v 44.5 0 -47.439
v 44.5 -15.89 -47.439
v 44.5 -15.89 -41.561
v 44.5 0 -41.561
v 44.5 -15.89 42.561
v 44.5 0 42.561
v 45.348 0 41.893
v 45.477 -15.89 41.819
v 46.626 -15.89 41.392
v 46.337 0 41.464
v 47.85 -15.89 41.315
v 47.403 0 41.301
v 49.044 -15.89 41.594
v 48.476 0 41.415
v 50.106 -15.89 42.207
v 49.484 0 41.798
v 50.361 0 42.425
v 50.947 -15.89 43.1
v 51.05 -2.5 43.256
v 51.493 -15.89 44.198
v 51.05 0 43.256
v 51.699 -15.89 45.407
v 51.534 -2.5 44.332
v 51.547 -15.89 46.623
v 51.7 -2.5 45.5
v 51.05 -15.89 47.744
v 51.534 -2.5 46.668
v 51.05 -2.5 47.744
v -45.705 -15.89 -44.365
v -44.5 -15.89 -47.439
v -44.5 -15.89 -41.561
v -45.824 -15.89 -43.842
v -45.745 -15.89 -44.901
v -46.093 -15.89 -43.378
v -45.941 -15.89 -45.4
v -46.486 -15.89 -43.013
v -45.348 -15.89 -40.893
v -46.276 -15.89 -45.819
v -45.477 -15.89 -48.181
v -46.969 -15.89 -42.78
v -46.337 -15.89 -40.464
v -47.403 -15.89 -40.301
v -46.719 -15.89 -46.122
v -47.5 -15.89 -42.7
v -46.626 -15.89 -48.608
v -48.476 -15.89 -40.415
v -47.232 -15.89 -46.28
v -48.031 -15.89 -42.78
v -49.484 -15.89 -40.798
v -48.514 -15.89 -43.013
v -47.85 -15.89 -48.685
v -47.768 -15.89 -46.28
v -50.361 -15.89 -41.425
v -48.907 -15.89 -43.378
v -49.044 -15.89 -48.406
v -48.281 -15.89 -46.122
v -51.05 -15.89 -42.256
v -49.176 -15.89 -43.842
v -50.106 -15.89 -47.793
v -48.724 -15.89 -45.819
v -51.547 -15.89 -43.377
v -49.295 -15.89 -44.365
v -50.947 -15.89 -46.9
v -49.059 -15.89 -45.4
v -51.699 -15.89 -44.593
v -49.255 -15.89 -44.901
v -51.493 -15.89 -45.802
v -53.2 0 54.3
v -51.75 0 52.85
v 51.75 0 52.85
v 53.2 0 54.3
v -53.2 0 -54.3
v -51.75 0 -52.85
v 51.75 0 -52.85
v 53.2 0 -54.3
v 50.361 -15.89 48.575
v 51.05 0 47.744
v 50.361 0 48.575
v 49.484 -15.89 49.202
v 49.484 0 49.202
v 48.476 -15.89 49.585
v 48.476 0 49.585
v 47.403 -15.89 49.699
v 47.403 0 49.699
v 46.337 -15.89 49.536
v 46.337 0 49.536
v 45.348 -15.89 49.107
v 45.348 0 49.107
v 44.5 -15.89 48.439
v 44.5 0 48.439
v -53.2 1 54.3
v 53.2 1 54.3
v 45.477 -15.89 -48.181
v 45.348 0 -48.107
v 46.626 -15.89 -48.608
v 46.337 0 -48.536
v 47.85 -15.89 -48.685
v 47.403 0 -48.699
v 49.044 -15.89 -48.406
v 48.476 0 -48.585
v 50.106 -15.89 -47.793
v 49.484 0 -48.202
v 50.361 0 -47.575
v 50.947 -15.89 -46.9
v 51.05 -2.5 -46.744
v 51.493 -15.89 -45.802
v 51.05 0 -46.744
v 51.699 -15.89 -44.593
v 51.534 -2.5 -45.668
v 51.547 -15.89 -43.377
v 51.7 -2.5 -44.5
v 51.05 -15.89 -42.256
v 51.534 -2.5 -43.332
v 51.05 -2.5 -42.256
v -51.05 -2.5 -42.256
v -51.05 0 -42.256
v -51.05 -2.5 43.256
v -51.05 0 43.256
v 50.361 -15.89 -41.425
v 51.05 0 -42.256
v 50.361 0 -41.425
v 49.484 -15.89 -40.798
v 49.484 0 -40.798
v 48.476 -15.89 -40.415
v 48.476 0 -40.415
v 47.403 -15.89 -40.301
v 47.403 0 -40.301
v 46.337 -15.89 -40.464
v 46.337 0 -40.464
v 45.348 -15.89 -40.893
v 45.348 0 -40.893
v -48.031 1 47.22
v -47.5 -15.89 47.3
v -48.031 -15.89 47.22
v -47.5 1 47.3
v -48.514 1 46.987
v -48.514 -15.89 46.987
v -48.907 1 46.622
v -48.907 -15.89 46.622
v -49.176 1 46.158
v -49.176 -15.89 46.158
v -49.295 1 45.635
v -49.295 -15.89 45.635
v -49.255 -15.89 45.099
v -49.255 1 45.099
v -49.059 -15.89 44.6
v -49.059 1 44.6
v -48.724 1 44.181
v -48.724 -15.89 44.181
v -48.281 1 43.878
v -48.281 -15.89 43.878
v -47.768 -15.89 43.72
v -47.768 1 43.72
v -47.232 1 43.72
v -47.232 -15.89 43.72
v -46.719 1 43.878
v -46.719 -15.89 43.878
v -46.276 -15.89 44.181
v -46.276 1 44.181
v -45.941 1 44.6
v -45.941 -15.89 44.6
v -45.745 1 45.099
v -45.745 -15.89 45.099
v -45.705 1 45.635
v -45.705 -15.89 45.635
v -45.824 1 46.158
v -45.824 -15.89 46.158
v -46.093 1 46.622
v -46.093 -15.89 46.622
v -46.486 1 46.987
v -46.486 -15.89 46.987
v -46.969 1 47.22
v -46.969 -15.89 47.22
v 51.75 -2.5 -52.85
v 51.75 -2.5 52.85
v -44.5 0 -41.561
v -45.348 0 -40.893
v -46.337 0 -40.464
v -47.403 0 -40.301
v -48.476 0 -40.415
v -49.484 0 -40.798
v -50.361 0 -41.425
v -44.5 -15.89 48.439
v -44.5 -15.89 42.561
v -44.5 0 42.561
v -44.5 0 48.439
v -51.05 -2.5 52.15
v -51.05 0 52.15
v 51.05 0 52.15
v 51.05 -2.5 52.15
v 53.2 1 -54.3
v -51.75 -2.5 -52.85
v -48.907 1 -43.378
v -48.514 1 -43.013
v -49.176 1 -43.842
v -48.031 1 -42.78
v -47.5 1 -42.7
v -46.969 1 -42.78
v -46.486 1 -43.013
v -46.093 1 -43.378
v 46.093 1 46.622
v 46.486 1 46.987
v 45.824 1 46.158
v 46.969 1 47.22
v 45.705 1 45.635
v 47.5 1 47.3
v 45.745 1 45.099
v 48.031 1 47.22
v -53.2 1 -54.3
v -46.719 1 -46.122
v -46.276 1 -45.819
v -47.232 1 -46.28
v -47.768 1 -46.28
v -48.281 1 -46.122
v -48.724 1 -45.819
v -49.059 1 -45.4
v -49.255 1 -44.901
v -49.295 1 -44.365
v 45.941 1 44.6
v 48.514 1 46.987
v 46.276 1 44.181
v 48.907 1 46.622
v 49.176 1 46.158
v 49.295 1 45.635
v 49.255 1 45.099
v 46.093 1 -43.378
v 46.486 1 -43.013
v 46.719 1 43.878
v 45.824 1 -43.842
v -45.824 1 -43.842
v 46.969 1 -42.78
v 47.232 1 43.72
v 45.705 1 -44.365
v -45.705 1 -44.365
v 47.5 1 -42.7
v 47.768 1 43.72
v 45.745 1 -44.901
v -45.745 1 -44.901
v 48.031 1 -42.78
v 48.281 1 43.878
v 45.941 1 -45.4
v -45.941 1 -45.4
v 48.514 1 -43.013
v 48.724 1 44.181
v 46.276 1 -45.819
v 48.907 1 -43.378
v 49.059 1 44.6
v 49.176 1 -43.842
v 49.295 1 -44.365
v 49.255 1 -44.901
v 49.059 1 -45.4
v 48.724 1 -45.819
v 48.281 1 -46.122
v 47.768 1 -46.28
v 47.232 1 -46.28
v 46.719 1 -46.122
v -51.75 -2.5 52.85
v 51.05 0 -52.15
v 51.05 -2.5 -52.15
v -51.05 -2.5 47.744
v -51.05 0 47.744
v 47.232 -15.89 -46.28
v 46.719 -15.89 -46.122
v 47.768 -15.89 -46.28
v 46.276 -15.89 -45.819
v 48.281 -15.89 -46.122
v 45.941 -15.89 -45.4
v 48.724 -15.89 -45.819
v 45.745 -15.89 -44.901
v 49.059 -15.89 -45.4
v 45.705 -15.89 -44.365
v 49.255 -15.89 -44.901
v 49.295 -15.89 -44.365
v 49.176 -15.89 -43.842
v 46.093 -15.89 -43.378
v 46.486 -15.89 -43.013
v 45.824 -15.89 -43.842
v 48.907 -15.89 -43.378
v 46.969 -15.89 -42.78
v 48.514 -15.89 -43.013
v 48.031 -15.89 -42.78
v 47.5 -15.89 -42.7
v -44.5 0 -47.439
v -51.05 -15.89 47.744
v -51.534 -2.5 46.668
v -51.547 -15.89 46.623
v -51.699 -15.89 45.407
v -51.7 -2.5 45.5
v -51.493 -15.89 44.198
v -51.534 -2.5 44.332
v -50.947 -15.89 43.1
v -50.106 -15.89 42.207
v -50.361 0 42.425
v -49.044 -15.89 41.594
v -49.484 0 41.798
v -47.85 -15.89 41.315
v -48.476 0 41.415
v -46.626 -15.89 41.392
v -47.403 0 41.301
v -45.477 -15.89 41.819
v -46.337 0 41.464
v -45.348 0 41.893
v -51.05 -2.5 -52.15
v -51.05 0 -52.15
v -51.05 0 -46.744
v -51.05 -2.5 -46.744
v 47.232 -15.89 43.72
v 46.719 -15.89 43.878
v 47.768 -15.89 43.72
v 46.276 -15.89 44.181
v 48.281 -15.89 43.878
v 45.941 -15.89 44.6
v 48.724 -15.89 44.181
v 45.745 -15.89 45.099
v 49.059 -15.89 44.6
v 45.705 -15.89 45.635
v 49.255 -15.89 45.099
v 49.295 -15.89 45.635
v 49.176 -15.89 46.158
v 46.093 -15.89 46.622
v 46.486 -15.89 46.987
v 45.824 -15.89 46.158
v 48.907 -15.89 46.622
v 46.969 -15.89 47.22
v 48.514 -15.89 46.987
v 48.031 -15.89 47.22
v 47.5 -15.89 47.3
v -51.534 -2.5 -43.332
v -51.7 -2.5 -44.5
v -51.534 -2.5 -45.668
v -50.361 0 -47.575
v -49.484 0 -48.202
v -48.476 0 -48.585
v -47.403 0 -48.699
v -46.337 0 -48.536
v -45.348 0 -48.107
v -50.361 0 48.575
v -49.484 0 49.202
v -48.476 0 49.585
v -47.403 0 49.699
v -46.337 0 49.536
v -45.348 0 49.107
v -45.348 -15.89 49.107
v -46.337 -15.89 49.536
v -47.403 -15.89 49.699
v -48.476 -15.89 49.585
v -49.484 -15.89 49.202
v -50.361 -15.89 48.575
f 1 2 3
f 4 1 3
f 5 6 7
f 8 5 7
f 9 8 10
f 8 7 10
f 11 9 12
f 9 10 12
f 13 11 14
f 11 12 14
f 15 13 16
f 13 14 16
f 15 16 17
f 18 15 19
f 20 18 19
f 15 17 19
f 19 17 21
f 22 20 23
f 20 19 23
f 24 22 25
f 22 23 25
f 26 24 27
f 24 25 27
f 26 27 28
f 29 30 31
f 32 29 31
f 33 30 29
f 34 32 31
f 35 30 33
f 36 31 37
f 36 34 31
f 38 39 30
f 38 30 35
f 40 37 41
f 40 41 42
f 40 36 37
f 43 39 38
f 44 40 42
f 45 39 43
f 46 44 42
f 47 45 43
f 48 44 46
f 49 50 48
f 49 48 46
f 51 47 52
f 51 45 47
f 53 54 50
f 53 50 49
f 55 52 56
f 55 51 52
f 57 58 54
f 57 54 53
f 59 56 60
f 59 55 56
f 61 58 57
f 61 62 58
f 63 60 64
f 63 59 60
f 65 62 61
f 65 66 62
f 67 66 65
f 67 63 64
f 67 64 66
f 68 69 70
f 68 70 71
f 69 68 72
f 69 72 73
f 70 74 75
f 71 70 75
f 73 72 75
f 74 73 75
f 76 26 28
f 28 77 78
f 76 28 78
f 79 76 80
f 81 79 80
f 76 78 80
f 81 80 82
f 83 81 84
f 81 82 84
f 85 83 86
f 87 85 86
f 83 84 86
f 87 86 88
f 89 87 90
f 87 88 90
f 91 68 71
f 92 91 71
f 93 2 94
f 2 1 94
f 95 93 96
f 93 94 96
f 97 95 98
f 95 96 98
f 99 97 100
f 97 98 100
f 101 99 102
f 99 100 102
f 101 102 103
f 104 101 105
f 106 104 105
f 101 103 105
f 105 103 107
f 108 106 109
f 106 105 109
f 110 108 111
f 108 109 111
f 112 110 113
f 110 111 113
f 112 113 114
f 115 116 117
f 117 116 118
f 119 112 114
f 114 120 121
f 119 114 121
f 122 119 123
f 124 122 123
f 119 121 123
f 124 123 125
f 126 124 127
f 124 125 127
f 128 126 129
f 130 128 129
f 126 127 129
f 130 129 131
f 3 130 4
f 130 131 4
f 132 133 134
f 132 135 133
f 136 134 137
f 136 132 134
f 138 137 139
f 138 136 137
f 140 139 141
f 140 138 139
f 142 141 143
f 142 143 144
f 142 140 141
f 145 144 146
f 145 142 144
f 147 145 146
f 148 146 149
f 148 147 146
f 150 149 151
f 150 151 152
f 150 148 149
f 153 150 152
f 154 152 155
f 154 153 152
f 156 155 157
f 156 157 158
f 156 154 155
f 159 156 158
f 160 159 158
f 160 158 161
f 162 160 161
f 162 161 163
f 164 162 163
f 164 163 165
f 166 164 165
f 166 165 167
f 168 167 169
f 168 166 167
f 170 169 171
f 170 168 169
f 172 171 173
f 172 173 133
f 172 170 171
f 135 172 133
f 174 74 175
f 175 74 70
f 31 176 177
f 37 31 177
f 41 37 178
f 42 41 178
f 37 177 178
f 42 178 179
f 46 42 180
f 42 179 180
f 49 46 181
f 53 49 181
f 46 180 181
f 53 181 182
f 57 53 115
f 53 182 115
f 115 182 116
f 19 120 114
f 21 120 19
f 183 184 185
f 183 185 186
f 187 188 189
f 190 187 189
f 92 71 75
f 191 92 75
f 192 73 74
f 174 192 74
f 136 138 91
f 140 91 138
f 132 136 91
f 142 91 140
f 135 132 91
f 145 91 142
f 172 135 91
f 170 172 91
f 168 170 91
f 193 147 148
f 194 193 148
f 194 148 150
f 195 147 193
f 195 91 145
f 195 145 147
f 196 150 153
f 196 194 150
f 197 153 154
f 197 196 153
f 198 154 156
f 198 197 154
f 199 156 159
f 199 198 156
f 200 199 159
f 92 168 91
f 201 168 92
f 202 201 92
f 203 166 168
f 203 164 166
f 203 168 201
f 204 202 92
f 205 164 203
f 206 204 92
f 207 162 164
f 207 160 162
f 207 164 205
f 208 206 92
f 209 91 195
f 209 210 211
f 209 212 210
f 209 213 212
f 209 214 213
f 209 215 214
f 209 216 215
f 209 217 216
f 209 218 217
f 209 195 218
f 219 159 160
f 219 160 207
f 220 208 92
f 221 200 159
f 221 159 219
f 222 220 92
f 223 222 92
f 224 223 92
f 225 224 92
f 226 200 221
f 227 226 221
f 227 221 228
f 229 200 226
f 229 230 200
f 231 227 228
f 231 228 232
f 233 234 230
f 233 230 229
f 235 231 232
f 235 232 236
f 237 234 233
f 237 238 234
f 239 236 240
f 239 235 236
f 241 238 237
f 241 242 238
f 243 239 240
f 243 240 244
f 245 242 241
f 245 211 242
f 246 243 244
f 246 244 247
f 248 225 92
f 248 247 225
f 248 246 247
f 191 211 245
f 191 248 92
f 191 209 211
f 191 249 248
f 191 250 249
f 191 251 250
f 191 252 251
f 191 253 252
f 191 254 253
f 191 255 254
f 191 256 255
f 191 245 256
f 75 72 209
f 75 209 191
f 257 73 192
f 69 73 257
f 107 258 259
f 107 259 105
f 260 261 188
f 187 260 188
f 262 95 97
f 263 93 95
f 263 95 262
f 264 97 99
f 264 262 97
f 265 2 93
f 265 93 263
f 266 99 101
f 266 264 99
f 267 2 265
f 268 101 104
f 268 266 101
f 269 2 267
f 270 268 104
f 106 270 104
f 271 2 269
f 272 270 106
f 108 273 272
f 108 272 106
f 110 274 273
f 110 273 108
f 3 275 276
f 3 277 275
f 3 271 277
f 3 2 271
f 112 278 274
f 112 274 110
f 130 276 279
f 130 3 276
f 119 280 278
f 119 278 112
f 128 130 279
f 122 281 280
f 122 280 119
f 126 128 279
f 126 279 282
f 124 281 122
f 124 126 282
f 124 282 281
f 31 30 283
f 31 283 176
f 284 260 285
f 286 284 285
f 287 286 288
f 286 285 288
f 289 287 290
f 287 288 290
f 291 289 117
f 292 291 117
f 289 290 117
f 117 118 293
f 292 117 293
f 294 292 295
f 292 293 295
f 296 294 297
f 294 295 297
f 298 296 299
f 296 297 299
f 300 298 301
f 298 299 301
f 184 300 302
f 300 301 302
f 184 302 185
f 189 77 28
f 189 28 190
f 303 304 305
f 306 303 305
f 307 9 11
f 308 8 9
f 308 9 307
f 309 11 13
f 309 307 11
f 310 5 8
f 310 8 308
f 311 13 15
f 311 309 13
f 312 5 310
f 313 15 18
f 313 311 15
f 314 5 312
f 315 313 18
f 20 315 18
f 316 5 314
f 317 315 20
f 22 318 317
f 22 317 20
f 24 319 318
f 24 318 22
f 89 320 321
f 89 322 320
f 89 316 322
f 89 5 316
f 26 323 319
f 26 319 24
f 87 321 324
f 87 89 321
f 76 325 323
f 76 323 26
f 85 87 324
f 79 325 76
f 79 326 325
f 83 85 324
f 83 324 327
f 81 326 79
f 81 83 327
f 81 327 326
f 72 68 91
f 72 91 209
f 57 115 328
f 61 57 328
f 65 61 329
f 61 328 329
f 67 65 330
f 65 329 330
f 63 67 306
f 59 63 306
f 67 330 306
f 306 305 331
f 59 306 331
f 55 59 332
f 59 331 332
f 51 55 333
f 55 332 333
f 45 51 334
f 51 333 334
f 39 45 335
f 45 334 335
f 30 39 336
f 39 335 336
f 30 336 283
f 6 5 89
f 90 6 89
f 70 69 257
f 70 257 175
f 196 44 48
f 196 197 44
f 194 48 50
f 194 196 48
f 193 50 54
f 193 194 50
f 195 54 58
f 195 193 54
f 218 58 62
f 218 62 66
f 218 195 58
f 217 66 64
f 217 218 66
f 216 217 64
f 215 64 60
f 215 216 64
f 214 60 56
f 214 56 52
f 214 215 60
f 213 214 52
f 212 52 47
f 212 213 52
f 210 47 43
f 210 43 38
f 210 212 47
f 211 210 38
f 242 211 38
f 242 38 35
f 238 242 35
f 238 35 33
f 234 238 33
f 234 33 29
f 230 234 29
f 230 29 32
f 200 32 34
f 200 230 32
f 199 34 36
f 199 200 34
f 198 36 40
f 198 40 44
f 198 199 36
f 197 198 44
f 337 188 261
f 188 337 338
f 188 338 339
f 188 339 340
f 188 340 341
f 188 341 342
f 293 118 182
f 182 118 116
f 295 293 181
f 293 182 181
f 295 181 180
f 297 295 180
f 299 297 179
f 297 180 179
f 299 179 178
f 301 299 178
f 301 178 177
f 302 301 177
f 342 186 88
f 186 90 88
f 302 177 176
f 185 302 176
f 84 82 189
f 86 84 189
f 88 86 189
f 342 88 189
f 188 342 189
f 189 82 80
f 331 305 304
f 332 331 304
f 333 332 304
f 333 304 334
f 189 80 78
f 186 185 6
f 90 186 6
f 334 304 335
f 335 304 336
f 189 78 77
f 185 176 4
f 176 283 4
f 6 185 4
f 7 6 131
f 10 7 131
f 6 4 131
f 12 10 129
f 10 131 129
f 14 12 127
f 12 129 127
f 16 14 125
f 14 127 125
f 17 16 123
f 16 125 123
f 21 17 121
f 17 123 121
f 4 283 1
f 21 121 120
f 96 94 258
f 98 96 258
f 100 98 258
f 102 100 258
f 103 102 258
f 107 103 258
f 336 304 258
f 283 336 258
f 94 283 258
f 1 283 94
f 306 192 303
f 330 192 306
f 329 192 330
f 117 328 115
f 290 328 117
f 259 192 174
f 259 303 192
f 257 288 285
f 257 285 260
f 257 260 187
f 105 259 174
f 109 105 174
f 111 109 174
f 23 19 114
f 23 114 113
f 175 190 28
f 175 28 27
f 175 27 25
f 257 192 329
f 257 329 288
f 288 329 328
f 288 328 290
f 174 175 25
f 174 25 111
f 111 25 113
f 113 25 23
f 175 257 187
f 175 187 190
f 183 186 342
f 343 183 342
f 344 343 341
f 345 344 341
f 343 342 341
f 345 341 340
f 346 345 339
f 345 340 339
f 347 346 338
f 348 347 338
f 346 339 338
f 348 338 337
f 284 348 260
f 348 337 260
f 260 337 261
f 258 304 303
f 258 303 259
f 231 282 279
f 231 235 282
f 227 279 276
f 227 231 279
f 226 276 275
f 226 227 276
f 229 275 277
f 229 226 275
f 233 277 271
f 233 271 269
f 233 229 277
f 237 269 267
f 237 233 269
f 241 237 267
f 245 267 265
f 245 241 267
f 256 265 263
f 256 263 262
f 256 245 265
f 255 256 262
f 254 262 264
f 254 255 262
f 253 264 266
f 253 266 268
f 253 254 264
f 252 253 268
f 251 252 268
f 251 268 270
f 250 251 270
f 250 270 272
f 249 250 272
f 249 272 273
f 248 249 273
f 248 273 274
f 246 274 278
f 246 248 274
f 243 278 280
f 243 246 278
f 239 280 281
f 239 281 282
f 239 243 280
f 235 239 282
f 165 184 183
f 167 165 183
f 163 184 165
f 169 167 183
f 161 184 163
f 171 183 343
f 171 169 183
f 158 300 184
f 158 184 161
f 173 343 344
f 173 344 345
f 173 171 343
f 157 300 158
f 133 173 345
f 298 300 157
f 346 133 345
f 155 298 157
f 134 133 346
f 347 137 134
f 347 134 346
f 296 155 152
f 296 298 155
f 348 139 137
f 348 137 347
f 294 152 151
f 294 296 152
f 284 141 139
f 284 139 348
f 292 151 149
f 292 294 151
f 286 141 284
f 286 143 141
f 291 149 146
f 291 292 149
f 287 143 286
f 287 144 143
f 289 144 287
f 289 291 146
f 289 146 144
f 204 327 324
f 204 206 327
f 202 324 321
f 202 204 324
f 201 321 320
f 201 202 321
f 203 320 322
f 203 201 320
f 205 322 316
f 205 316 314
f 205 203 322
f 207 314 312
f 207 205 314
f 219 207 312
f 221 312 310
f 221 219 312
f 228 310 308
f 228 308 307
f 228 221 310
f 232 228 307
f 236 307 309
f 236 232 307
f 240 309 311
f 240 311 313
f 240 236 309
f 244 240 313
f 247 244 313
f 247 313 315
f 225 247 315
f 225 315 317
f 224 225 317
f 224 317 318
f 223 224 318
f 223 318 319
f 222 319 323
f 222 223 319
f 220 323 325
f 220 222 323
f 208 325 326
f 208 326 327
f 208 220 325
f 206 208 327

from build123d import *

# Parameters (mm, degrees)
SKETCH_1_W          = 106.4
SKETCH_1_H          = 108.6
EXTRUDE_1_DEPTH     = 1
SKETCH_2_W          = 103.5
SKETCH_2_H          = 105.7
SKETCH_2_W_2        = 102.1
SKETCH_2_H_2        = 104.3
EXTRUDE_2_DEPTH     = 2.5
SKETCH_4_R          = 1.8
CUT_EXTRUDE_1_DEPTH = 77.098488815
SKETCH_13_R         = 4.2
SKETCH_13_R_2       = 1.8
EXTRUDE_8_DEPTH     = 15.89
SKETCH_14_W         = 89
SKETCH_14_H         = 101.449206074
CUT_EXTRUDE_6_DEPTH = 15.89


with BuildPart() as part:
    # 草图1 → 凸台-拉伸1 (new body)
    with BuildSketch(Plane(origin=(0, 0, 0), x_dir=(1, 0, 0), z_dir=(0, 1, 0))):
        Rectangle(SKETCH_1_W, SKETCH_1_H)
    extrude(amount=EXTRUDE_1_DEPTH)

    # 草图2 → 凸台-拉伸2 (add)
    with BuildSketch(Plane.XZ):
        Rectangle(SKETCH_2_W, SKETCH_2_H)
        Rectangle(SKETCH_2_W_2, SKETCH_2_H_2, mode=Mode.SUBTRACT)
    extrude(amount=EXTRUDE_2_DEPTH)

    # 草图4 → 切除-拉伸1 (cut, through all)
    with BuildSketch(Plane(origin=(0, 1, 0), x_dir=(1, 0, 0), z_dir=(0, 1, 0))):
        with Locations(Location((47.5, 44.5, 0), (0, 0, 270))):
            Circle(SKETCH_4_R)
        with Locations(Location((-47.5, 44.5, 0), (0, 0, 270))):
            Circle(SKETCH_4_R)
        with Locations(Location((-47.5, -45.5, 0), (0, 0, 270))):
            Circle(SKETCH_4_R)
        with Locations(Location((47.5, -45.5, 0), (0, 0, 270))):
            Circle(SKETCH_4_R)
    extrude(amount=-CUT_EXTRUDE_1_DEPTH, mode=Mode.SUBTRACT)

    # 草图13 → 凸台-拉伸8 (add)
    # profile 1 of 4: a face of its own
    with BuildSketch(Plane.XZ):
        with Locations(Location((-47.5, 45.5, 0), (0, 0, 147.697454791))):
            Circle(SKETCH_13_R)
        with Locations(Location((-47.5, 45.5, 0), (0, 0, 90))):
            Circle(SKETCH_13_R_2, mode=Mode.SUBTRACT)
    # profile 2 of 4: a face of its own
    with BuildSketch(Plane.XZ):
        with Locations(Location((47.5, 45.5, 0), (0, 0, 32.302545209))):
            Circle(SKETCH_13_R)
        with Locations(Location((47.5, 45.5, 0), (0, 0, 90))):
            Circle(SKETCH_13_R_2, mode=Mode.SUBTRACT)
    # profile 3 of 4: a face of its own
    with BuildSketch(Plane.XZ):
        with Locations(Location((-47.5, -44.5, 0), (0, 0, 147.697454791))):
            Circle(SKETCH_13_R)
        with Locations(Location((-47.5, -44.5, 0), (0, 0, 90))):
            Circle(SKETCH_13_R_2, mode=Mode.SUBTRACT)
    # profile 4 of 4: a face of its own
    with BuildSketch(Plane.XZ):
        with Locations(Location((47.5, -44.5, 0), (0, 0, 32.302545209))):
            Circle(SKETCH_13_R)
        with Locations(Location((47.5, -44.5, 0), (0, 0, 90))):
            Circle(SKETCH_13_R_2, mode=Mode.SUBTRACT)
    extrude(amount=EXTRUDE_8_DEPTH)

    # 草图14 → 切除-拉伸6 (cut)
    with BuildSketch(Plane.XZ.offset(15.89)):
        Rectangle(SKETCH_14_W, SKETCH_14_H)
    extrude(amount=-CUT_EXTRUDE_6_DEPTH, mode=Mode.SUBTRACT)


solid = part.part
